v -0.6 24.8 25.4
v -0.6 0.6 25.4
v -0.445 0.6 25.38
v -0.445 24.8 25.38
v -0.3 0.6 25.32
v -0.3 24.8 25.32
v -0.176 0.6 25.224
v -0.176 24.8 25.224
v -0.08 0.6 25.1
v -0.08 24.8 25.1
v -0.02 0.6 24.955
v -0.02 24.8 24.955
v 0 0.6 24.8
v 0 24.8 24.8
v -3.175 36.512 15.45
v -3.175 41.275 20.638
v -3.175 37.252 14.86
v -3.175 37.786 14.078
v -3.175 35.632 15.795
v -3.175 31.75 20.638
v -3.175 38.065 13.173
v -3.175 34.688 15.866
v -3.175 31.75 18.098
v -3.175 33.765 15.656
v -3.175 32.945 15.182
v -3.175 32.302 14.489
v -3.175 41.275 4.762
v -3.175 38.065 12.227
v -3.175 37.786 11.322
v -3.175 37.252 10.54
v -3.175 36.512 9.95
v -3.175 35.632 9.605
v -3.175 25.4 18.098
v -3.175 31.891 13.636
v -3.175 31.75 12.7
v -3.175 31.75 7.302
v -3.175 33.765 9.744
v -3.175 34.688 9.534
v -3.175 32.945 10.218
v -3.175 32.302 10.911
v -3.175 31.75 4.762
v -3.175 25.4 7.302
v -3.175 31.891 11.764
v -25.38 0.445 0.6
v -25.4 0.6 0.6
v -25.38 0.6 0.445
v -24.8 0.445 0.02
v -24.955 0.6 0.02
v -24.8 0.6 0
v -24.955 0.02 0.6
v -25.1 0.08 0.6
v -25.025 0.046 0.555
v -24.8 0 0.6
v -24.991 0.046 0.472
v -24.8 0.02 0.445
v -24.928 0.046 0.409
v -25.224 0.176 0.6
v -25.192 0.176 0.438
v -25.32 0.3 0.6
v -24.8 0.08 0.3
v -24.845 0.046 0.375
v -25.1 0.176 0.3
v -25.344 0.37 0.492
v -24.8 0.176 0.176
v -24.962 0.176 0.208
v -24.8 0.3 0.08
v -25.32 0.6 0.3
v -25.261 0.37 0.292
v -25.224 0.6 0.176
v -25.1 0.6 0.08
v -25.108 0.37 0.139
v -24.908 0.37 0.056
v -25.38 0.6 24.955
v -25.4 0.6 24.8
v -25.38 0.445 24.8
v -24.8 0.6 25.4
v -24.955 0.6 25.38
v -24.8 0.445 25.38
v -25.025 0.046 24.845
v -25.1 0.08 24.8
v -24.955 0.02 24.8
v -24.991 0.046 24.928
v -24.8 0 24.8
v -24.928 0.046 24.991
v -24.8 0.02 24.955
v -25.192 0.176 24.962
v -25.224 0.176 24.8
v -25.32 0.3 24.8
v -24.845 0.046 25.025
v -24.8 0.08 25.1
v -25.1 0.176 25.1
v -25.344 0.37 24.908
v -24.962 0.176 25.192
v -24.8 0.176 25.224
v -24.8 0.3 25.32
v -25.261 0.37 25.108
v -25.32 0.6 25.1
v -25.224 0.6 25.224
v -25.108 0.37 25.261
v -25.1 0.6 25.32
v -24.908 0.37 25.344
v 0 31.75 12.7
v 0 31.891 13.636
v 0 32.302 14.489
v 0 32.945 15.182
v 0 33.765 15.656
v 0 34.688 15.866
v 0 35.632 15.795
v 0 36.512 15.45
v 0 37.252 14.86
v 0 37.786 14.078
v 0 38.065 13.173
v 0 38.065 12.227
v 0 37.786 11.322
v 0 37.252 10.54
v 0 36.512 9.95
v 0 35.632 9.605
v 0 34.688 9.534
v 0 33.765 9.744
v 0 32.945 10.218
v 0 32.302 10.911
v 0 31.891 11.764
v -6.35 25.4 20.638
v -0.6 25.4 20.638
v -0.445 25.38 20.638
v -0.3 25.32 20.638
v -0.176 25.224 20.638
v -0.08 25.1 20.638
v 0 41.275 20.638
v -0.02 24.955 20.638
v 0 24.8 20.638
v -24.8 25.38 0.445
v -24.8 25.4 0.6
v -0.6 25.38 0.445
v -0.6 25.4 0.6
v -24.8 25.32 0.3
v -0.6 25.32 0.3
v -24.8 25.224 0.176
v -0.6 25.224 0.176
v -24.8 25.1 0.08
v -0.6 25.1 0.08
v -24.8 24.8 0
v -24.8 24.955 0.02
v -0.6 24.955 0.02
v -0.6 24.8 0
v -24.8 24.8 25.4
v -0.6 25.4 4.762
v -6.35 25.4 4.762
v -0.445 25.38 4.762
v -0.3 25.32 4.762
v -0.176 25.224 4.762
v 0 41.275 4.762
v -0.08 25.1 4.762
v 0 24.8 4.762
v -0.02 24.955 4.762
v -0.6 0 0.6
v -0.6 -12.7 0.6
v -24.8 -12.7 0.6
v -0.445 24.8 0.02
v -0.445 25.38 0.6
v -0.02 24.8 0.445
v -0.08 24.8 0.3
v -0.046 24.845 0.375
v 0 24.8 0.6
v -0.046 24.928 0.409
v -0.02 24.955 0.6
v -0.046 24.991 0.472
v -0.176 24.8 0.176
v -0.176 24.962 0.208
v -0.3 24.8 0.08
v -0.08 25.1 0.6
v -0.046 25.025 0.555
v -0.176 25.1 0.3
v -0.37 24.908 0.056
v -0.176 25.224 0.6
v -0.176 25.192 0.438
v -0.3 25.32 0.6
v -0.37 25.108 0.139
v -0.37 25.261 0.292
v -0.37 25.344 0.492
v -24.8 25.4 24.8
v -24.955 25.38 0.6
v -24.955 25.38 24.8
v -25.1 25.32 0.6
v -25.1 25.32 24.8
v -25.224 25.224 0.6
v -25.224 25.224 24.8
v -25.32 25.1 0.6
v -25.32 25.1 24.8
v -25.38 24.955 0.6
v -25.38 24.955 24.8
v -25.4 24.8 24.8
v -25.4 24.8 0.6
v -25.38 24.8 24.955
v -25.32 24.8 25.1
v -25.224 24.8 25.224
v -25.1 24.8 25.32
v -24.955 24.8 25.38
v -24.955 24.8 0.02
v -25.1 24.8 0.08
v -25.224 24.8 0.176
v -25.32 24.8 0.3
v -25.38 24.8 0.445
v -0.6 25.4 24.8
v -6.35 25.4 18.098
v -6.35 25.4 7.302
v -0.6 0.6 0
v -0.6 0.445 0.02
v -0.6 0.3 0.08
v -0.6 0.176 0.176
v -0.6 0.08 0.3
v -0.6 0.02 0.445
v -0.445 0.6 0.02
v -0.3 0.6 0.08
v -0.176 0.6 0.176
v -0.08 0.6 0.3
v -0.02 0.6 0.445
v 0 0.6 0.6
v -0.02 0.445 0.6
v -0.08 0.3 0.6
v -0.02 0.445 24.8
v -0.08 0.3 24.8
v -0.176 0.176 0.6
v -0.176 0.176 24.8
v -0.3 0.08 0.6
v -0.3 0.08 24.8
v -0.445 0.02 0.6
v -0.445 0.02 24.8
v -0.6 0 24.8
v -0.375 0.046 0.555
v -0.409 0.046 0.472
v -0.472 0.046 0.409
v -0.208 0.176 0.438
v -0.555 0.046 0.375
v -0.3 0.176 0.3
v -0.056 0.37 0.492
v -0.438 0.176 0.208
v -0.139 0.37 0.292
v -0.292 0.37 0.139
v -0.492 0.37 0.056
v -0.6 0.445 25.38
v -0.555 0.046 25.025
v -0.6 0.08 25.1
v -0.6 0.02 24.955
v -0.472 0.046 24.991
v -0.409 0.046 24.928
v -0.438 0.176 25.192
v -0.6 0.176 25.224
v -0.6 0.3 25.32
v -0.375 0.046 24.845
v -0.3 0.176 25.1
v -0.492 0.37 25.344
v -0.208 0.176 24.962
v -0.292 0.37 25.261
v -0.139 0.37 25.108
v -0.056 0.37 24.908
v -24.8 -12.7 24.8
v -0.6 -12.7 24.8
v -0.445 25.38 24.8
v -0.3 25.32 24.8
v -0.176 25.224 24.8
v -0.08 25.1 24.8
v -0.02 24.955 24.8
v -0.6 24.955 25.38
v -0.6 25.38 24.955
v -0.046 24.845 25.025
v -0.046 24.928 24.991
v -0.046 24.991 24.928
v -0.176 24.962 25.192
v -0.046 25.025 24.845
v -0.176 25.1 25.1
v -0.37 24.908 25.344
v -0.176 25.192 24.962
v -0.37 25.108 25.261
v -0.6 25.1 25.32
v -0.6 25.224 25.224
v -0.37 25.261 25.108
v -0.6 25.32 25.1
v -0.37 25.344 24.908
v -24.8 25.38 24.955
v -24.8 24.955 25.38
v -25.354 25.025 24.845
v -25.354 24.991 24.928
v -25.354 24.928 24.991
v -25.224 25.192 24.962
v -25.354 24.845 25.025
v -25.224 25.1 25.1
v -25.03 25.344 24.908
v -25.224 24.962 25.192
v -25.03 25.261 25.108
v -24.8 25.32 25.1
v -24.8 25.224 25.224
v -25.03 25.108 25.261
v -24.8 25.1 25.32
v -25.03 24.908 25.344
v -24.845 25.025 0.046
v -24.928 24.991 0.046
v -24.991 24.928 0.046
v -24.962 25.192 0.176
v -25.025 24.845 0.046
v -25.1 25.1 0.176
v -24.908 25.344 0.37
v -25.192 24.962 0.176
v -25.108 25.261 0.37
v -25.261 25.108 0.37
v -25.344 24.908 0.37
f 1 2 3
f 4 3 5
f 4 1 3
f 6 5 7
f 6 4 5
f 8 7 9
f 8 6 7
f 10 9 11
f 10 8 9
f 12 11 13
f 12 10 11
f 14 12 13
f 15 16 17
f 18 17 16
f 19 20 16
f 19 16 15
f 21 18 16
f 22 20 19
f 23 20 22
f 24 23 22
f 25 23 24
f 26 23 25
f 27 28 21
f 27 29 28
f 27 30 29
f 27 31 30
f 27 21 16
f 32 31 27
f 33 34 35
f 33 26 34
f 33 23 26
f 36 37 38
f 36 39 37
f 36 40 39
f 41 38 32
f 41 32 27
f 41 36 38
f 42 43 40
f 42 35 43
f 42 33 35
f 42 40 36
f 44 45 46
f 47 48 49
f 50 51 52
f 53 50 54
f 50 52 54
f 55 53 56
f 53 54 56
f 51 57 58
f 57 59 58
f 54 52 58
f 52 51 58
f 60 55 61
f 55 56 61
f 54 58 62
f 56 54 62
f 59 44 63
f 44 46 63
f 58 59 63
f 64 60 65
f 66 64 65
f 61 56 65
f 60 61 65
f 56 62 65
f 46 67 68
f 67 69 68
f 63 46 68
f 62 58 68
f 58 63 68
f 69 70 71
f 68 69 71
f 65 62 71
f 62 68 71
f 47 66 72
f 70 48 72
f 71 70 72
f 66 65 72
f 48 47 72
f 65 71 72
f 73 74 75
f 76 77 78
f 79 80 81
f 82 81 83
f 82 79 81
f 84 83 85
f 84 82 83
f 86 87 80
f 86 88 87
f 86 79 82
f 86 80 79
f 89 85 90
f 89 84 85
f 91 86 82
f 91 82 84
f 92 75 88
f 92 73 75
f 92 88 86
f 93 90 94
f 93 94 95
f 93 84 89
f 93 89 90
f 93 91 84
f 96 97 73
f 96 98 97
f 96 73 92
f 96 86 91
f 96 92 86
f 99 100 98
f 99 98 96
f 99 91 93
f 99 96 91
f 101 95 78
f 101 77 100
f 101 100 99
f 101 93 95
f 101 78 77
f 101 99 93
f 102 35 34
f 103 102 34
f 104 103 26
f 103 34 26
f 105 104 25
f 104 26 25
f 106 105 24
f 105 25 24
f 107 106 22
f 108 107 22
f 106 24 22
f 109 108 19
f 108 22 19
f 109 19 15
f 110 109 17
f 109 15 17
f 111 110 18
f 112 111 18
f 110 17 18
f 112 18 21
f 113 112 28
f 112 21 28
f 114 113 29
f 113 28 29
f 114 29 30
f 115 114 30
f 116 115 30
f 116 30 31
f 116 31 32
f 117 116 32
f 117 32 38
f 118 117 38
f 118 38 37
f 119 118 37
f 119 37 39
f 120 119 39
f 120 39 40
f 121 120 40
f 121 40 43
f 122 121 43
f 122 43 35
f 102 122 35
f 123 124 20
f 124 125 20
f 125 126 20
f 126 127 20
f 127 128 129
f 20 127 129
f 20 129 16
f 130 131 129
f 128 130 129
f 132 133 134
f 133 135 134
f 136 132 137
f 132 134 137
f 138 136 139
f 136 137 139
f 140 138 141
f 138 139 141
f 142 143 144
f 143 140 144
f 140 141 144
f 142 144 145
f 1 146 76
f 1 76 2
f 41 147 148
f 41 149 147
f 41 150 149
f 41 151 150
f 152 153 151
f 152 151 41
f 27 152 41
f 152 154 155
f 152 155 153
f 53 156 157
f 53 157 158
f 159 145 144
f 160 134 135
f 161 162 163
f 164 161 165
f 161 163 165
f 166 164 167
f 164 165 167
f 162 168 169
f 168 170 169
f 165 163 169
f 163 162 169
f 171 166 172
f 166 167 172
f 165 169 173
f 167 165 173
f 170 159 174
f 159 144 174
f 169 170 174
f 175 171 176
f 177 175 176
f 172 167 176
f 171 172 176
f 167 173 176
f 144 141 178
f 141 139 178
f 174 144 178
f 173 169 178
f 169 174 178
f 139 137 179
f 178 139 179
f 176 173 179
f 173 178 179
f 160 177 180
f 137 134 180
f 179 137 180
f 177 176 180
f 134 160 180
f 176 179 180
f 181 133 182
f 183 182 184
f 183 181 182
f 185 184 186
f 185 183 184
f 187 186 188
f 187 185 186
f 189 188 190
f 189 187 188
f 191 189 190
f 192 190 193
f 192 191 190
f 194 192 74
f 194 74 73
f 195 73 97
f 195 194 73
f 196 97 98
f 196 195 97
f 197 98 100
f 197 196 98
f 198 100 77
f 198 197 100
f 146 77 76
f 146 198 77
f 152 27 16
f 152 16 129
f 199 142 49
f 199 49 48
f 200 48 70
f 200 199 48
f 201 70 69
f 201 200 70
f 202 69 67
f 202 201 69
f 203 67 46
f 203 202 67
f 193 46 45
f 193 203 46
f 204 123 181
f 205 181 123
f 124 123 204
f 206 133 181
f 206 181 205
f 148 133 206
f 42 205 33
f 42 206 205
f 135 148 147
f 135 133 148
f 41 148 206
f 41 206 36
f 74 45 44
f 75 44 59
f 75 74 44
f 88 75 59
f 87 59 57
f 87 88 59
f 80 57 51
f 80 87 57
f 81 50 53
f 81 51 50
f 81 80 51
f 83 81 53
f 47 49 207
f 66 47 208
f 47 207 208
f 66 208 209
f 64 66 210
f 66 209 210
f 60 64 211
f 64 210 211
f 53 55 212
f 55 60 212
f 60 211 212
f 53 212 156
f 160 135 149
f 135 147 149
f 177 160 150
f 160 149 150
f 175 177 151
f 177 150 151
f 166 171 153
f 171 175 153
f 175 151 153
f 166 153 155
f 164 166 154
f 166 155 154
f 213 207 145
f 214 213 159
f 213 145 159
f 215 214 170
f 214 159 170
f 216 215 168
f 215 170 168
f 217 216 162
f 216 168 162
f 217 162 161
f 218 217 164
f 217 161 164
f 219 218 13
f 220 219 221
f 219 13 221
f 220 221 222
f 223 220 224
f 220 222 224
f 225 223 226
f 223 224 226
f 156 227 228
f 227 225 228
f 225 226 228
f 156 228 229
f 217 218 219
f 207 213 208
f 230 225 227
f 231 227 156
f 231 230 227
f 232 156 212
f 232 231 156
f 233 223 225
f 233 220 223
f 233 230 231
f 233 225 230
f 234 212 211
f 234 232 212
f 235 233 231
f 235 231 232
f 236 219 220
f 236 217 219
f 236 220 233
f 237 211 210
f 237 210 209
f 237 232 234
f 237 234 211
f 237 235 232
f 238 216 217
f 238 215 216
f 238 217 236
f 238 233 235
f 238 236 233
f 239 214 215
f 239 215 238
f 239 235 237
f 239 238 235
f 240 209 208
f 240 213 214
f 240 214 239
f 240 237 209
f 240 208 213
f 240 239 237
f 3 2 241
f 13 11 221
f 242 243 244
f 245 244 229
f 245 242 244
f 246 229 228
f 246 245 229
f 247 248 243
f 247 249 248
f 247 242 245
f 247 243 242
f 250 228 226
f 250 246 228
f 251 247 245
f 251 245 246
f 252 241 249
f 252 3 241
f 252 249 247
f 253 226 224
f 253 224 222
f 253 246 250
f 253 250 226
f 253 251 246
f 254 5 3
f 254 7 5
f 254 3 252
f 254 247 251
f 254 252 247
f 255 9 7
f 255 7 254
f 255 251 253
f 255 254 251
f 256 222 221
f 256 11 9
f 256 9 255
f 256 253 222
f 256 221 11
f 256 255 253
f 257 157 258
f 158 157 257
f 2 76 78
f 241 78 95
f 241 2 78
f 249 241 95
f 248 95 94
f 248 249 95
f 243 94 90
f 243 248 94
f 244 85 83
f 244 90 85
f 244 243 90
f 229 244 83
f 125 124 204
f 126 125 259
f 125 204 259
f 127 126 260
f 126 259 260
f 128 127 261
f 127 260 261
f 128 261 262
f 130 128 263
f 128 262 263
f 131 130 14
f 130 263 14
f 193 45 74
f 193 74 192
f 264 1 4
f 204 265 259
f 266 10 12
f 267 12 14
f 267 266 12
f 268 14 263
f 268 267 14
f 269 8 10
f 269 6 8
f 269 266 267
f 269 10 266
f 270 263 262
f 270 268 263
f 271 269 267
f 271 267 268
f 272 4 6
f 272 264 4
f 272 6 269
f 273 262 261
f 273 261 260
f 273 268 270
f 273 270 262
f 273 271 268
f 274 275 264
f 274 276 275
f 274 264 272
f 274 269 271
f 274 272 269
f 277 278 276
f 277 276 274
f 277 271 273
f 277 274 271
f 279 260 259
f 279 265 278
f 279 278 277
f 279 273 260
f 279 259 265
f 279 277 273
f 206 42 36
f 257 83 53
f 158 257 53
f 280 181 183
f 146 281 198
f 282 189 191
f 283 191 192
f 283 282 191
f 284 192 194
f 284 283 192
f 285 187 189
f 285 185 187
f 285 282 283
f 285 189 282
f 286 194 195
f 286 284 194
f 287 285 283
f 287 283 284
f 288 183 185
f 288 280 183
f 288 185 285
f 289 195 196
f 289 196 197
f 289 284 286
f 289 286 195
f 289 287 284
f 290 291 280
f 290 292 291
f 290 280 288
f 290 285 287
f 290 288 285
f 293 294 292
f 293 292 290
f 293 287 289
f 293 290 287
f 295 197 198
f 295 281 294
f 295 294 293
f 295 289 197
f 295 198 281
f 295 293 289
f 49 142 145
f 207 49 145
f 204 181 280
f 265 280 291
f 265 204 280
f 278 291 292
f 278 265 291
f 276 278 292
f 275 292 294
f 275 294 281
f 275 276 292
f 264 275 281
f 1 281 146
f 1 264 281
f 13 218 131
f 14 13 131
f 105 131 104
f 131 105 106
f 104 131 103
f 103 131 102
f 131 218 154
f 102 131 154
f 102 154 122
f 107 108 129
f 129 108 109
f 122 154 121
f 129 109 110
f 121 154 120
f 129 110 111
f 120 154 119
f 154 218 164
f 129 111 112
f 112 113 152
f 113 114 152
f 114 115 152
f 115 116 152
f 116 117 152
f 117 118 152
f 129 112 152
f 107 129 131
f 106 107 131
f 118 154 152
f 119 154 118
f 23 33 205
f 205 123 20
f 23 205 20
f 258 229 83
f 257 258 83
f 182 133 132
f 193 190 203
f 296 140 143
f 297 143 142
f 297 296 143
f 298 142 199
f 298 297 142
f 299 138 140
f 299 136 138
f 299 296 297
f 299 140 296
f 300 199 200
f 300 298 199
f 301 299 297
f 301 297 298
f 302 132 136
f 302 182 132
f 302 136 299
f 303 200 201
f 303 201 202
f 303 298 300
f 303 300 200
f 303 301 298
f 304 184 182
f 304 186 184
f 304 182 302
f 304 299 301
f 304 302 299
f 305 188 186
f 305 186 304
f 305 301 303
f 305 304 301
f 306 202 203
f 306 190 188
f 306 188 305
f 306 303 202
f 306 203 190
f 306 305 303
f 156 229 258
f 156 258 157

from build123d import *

# Parameters (mm, degrees)
SKETCH1_W           = 25.4
SKETCH1_H           = 25.4
BOSS_EXTRUDE1_DEPTH = 25.4
SKETCH2_W           = 3.175
SKETCH2_H           = 15.875
BOSS_EXTRUDE2_DEPTH = 15.875
BOSS_EXTRUDE3_DEPTH = 2.54
SKETCH8_R           = 3.175
CUT_EXTRUDE1_DEPTH  = 54.317316605
FILLET1_R           = 0.6
SKETCH9_W           = 24.2
SKETCH9_H           = 24.2
BOSS_EXTRUDE4_DEPTH = 12.7


with BuildPart() as part:
    # Sketch1 → Boss-Extrude1 (new body)
    with BuildSketch(Plane.XY):
        with Locations((-12.7, 12.7)):
            Rectangle(SKETCH1_W, SKETCH1_H)
    extrude(amount=BOSS_EXTRUDE1_DEPTH)

    # Sketch2 → Boss-Extrude2 (add)
    with BuildSketch(Plane(origin=(0, 25.4, 0), x_dir=(1, 0, 0), z_dir=(0, 1, 0))):
        with Locations((-1.5875, -12.7)):
            Rectangle(SKETCH2_W, SKETCH2_H)
    extrude(amount=BOSS_EXTRUDE2_DEPTH)

    # Sketch6 → Boss-Extrude3 (add)
    with BuildSketch(Plane.XY.offset(20.6375)):
        Polygon((-3.175, 25.4), (-6.35, 25.4), (-3.175, 31.75), align=None)
    boss_extrude3 = extrude(amount=-BOSS_EXTRUDE3_DEPTH)

    # Mirror1: Boss-Extrude3 across plane
    add(boss_extrude3.mirror(Plane.XY.offset(12.7)))

    # Sketch8 → Cut-Extrude1 (cut, through all)
    with BuildSketch(Plane.ZY.offset(3.175)):
        with Locations(Location((12.7, 34.925, 0), (0, 0, 270))):
            Circle(SKETCH8_R)
    extrude(amount=-CUT_EXTRUDE1_DEPTH, mode=Mode.SUBTRACT)

    # Fillet1
    fillet1_edges = [part.edges().sort_by_distance(p)[0] for p in [
        (-12.7, 25.4, 25.4),
        (0, 12.7, 25.4),
        (-25.4, 25.4, 12.7),
        (-25.4, 12.7, 25.4),
        (-12.7, 25.4, 0),
        (-25.4, 12.7, 0),
        (0, 12.7, 0),
        (-25.4, 0, 12.7),
        (-12.7, 0, 25.4),
        (0, 0, 12.7),
        (-12.7, 0, 0),
        (0, 25.4, 23.01875),
        (0, 25.4, 2.38125),
    ]]
    fillet(fillet1_edges, radius=FILLET1_R)

    # Sketch9 → Boss-Extrude4 (add)
    with BuildSketch(Plane(origin=(0, 0, 0), x_dir=(-1, 0, 0), z_dir=(0, -1, 0))):
        with Locations((12.7, -12.7)):
            Rectangle(SKETCH9_W, SKETCH9_H)
    extrude(amount=BOSS_EXTRUDE4_DEPTH)


solid = part.part
